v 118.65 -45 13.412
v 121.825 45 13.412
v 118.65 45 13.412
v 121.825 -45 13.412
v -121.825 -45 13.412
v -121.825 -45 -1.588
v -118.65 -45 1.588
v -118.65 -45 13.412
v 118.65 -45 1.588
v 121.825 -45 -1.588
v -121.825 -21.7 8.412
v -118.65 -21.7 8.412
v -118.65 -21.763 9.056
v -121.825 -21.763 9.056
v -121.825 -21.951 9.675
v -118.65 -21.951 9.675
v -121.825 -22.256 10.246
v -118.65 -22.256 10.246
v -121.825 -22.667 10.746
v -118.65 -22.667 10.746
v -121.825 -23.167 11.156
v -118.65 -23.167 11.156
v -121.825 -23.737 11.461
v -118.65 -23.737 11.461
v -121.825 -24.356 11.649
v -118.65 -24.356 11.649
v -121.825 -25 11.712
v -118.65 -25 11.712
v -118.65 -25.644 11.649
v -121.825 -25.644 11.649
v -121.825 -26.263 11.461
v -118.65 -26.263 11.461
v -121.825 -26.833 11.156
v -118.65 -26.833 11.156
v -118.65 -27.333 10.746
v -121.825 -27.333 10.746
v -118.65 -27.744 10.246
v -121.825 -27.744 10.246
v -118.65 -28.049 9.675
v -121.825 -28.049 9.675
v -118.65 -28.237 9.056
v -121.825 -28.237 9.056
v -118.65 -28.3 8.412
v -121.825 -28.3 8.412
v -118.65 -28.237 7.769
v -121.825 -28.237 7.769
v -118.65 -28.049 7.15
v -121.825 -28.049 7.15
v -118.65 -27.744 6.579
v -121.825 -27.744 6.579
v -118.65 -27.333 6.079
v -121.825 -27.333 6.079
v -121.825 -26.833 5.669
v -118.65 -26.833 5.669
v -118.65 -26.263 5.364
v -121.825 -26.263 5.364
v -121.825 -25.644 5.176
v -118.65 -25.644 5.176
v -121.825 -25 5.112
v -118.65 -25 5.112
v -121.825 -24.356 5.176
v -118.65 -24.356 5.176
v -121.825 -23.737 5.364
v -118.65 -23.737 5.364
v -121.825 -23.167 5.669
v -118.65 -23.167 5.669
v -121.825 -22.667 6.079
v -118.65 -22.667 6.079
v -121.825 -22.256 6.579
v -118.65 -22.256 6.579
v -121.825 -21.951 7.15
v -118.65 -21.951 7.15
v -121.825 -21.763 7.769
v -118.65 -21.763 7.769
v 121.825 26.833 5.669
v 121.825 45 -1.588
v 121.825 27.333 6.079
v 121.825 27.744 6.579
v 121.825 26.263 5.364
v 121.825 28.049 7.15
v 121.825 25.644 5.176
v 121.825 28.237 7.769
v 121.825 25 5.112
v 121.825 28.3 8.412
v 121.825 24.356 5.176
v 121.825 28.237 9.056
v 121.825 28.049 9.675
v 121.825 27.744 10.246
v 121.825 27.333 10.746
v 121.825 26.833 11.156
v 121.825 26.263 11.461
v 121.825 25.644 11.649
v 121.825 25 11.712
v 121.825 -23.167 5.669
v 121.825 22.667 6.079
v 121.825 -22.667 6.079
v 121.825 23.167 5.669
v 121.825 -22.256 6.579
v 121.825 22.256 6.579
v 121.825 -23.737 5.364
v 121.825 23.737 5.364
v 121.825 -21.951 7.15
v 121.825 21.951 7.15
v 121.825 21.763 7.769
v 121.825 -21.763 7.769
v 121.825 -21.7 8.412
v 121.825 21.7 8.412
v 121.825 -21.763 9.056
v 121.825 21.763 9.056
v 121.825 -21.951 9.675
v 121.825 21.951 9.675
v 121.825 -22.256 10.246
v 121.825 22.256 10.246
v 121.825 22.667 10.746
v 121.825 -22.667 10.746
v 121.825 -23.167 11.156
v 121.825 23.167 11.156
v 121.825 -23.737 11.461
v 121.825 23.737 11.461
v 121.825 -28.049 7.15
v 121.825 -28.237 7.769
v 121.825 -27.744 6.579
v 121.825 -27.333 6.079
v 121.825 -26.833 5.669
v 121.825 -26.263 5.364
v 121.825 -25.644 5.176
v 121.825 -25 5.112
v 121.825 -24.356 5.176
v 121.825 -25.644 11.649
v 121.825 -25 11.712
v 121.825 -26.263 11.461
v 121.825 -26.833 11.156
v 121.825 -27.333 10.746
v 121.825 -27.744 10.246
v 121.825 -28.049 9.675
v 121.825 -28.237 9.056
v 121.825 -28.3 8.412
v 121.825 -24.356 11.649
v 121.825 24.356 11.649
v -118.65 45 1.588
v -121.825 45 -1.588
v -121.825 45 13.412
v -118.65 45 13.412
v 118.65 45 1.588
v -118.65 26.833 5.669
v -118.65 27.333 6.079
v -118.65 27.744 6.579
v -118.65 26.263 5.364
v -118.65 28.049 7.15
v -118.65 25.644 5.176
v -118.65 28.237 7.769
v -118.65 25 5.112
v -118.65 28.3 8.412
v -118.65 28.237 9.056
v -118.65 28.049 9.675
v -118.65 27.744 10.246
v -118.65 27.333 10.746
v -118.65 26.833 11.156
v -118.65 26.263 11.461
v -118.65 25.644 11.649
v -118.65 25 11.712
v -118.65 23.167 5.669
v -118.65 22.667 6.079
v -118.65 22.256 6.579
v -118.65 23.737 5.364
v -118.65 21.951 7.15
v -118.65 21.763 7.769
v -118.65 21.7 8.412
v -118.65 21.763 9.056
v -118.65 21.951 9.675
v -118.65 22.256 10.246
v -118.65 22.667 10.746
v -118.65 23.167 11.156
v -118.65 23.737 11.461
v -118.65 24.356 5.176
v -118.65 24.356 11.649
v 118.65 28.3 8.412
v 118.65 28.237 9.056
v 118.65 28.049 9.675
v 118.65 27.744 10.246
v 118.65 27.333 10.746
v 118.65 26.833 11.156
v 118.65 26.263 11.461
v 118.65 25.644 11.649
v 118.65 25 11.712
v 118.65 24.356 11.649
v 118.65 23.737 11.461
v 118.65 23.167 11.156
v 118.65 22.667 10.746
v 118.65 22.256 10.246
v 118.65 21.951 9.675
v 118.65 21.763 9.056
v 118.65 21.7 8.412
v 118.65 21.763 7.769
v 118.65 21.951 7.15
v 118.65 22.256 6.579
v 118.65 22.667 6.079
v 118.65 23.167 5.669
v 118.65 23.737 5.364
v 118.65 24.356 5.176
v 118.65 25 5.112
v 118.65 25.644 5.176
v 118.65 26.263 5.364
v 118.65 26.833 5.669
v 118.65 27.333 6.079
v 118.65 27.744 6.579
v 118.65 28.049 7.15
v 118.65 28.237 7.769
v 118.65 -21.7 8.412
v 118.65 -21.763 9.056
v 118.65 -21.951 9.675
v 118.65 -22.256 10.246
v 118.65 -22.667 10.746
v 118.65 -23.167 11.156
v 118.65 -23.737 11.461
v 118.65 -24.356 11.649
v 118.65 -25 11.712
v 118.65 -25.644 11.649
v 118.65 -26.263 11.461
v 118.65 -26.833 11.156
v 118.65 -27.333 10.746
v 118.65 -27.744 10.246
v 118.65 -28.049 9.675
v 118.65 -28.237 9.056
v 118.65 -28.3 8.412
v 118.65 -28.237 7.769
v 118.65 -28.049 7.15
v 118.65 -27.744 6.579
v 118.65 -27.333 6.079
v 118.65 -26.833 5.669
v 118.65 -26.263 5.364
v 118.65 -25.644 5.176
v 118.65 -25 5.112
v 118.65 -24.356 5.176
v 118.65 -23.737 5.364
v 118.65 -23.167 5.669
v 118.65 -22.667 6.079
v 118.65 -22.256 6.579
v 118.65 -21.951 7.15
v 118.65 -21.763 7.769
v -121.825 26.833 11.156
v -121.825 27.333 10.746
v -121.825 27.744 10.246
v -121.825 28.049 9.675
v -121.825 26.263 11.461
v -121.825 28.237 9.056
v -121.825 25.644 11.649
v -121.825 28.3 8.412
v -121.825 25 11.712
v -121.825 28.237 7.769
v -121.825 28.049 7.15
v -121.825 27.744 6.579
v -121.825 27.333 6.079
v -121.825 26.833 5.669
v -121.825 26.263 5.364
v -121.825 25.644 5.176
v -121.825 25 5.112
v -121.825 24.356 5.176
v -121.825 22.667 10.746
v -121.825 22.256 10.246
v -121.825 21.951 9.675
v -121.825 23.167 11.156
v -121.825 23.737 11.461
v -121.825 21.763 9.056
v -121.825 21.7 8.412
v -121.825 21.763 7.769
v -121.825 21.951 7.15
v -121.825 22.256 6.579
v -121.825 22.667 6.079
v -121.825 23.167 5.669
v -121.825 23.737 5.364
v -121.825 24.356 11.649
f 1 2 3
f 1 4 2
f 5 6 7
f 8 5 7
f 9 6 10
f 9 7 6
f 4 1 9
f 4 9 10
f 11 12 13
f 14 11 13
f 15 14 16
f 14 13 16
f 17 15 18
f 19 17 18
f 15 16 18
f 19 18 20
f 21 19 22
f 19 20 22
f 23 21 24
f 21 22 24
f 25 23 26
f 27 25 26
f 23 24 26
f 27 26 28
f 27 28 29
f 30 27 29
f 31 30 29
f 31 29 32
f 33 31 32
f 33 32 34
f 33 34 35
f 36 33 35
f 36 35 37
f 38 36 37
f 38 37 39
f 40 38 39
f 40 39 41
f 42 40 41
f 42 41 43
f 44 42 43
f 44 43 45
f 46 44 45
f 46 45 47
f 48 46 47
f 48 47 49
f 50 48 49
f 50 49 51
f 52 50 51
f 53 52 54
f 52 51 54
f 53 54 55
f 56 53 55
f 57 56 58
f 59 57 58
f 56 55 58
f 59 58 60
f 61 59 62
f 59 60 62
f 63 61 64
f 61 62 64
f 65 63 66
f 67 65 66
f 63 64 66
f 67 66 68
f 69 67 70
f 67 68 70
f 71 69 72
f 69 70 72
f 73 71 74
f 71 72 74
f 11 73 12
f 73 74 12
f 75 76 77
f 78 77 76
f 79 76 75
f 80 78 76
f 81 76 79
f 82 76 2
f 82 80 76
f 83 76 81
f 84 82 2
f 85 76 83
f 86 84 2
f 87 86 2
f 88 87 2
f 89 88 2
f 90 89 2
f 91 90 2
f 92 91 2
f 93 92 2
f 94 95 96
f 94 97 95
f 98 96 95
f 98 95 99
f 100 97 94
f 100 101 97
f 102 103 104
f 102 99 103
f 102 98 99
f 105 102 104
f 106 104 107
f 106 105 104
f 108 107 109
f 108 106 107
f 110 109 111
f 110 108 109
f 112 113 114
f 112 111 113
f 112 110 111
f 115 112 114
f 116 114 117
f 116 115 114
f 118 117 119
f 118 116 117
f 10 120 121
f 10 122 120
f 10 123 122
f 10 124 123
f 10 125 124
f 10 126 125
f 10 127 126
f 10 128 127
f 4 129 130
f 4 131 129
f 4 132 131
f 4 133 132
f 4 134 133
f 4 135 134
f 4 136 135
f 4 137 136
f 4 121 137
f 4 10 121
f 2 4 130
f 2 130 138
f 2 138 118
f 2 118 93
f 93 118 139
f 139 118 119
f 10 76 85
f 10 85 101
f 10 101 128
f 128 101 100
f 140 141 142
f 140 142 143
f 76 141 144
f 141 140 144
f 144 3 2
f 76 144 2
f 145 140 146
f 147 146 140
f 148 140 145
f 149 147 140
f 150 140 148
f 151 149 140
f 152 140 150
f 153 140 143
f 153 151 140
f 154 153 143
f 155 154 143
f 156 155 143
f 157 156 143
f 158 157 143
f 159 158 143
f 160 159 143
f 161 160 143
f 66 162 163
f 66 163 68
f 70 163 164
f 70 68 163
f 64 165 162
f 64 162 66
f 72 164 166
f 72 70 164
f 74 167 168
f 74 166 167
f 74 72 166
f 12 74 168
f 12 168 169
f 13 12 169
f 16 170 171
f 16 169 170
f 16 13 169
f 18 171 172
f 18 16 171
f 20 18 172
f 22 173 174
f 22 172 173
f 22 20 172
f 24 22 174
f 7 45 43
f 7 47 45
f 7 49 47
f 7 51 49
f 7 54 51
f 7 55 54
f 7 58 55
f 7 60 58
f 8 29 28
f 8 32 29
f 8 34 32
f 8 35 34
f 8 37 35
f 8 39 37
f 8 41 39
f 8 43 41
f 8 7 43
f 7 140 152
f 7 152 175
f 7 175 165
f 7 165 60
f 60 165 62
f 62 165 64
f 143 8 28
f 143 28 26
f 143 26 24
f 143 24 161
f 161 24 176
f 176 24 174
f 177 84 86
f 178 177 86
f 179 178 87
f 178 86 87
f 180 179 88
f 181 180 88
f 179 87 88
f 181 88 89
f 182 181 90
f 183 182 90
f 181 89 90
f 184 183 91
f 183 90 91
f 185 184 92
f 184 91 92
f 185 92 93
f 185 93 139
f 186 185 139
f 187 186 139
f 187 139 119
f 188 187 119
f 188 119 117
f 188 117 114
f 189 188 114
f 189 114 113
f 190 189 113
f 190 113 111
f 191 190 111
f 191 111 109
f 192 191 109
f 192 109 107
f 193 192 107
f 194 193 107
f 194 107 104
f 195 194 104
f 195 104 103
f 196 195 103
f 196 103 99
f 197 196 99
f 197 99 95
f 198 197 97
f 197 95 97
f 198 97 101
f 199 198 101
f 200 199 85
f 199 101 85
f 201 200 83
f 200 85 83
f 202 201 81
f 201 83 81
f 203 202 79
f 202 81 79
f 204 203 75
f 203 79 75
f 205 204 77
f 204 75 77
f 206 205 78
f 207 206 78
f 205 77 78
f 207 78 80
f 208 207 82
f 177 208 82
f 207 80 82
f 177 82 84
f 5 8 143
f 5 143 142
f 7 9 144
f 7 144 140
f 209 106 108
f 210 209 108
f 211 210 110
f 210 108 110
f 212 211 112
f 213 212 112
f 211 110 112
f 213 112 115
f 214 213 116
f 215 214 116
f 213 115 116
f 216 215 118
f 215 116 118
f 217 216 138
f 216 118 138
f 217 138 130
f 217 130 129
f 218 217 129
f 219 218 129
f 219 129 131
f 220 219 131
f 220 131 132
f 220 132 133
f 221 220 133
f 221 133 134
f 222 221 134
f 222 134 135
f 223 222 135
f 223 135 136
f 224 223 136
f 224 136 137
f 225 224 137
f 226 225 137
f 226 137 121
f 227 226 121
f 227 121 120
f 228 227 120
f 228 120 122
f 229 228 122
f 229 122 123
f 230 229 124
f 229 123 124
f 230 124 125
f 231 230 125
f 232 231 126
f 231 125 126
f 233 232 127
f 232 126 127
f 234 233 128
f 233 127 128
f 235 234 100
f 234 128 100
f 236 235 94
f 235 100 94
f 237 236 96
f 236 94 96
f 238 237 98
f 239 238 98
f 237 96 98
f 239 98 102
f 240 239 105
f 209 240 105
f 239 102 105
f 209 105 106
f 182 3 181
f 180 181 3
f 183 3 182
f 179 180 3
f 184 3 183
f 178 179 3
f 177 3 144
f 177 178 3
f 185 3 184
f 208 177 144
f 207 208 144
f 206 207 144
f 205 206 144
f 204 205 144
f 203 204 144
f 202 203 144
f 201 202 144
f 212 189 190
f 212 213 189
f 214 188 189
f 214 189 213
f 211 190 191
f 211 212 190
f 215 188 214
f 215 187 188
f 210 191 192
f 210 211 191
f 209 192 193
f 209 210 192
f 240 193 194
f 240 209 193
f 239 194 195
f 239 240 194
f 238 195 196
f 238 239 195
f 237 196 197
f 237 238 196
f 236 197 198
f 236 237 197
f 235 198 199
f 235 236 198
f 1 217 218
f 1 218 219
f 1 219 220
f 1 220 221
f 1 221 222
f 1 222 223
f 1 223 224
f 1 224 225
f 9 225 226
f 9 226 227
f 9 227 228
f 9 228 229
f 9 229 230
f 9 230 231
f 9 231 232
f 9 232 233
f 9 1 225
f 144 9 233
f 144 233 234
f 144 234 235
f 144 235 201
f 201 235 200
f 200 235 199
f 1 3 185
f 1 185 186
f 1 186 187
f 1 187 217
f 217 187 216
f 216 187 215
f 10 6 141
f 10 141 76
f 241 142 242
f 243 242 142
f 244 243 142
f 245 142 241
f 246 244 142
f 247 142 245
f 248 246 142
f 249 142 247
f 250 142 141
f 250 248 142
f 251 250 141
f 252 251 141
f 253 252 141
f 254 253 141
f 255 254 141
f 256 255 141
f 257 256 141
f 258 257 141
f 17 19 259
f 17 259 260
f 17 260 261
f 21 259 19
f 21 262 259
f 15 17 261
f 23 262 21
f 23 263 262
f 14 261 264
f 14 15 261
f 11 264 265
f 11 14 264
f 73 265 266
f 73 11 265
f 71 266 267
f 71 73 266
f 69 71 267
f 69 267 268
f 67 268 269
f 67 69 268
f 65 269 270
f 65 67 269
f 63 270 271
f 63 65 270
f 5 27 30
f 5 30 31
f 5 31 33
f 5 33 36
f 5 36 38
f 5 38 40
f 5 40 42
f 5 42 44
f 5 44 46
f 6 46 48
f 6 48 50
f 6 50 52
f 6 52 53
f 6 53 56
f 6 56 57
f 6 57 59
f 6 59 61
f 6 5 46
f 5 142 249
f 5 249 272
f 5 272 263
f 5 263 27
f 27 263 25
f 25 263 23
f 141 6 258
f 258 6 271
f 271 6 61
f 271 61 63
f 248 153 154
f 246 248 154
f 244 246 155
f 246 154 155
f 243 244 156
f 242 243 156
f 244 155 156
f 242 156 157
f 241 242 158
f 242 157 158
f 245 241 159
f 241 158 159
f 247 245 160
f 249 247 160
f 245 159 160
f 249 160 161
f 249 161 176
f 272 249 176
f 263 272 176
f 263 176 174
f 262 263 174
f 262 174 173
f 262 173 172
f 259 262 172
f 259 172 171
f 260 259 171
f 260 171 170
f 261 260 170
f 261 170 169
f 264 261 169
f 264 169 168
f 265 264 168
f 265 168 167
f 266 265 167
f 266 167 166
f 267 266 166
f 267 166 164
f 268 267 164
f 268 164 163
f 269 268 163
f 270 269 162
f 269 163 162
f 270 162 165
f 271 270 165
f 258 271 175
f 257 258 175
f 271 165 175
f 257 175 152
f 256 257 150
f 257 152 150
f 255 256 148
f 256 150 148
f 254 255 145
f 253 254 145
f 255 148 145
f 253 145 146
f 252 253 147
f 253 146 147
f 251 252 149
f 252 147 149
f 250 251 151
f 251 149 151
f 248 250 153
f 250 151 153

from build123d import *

# Parameters (mm, degrees)
F1_DEPTH = 45
F2_R     = 3.3
F3_DEPTH = 243.651


with BuildPart() as f1:
    # F0 (on Front) → F1 (new body, symmetric)
    with BuildSketch(Plane.XZ):
        Polygon((118.65, 13.4125), (118.65, 1.5875), (-118.65, 1.5875), (-118.65, 13.4125), (-121.825, 13.4125), (-121.825, 1.5875), (-121.825, -1.5875), (-118.65, -1.5875), (118.65, -1.5875), (121.825, -1.5875), (121.825, 1.5875), (121.825, 13.4125), align=None)
    extrude(amount=F1_DEPTH, both=True)

    # F2 (on face) → F3 (cut, through all)
    with BuildSketch(Plane.YZ.offset(121.825)):
        with Locations((-25, 8.4125)):
            Circle(F2_R)
        with Locations((25, 8.4125)):
            Circle(F2_R)
    extrude(amount=-F3_DEPTH, mode=Mode.SUBTRACT)


solid = f1.part
